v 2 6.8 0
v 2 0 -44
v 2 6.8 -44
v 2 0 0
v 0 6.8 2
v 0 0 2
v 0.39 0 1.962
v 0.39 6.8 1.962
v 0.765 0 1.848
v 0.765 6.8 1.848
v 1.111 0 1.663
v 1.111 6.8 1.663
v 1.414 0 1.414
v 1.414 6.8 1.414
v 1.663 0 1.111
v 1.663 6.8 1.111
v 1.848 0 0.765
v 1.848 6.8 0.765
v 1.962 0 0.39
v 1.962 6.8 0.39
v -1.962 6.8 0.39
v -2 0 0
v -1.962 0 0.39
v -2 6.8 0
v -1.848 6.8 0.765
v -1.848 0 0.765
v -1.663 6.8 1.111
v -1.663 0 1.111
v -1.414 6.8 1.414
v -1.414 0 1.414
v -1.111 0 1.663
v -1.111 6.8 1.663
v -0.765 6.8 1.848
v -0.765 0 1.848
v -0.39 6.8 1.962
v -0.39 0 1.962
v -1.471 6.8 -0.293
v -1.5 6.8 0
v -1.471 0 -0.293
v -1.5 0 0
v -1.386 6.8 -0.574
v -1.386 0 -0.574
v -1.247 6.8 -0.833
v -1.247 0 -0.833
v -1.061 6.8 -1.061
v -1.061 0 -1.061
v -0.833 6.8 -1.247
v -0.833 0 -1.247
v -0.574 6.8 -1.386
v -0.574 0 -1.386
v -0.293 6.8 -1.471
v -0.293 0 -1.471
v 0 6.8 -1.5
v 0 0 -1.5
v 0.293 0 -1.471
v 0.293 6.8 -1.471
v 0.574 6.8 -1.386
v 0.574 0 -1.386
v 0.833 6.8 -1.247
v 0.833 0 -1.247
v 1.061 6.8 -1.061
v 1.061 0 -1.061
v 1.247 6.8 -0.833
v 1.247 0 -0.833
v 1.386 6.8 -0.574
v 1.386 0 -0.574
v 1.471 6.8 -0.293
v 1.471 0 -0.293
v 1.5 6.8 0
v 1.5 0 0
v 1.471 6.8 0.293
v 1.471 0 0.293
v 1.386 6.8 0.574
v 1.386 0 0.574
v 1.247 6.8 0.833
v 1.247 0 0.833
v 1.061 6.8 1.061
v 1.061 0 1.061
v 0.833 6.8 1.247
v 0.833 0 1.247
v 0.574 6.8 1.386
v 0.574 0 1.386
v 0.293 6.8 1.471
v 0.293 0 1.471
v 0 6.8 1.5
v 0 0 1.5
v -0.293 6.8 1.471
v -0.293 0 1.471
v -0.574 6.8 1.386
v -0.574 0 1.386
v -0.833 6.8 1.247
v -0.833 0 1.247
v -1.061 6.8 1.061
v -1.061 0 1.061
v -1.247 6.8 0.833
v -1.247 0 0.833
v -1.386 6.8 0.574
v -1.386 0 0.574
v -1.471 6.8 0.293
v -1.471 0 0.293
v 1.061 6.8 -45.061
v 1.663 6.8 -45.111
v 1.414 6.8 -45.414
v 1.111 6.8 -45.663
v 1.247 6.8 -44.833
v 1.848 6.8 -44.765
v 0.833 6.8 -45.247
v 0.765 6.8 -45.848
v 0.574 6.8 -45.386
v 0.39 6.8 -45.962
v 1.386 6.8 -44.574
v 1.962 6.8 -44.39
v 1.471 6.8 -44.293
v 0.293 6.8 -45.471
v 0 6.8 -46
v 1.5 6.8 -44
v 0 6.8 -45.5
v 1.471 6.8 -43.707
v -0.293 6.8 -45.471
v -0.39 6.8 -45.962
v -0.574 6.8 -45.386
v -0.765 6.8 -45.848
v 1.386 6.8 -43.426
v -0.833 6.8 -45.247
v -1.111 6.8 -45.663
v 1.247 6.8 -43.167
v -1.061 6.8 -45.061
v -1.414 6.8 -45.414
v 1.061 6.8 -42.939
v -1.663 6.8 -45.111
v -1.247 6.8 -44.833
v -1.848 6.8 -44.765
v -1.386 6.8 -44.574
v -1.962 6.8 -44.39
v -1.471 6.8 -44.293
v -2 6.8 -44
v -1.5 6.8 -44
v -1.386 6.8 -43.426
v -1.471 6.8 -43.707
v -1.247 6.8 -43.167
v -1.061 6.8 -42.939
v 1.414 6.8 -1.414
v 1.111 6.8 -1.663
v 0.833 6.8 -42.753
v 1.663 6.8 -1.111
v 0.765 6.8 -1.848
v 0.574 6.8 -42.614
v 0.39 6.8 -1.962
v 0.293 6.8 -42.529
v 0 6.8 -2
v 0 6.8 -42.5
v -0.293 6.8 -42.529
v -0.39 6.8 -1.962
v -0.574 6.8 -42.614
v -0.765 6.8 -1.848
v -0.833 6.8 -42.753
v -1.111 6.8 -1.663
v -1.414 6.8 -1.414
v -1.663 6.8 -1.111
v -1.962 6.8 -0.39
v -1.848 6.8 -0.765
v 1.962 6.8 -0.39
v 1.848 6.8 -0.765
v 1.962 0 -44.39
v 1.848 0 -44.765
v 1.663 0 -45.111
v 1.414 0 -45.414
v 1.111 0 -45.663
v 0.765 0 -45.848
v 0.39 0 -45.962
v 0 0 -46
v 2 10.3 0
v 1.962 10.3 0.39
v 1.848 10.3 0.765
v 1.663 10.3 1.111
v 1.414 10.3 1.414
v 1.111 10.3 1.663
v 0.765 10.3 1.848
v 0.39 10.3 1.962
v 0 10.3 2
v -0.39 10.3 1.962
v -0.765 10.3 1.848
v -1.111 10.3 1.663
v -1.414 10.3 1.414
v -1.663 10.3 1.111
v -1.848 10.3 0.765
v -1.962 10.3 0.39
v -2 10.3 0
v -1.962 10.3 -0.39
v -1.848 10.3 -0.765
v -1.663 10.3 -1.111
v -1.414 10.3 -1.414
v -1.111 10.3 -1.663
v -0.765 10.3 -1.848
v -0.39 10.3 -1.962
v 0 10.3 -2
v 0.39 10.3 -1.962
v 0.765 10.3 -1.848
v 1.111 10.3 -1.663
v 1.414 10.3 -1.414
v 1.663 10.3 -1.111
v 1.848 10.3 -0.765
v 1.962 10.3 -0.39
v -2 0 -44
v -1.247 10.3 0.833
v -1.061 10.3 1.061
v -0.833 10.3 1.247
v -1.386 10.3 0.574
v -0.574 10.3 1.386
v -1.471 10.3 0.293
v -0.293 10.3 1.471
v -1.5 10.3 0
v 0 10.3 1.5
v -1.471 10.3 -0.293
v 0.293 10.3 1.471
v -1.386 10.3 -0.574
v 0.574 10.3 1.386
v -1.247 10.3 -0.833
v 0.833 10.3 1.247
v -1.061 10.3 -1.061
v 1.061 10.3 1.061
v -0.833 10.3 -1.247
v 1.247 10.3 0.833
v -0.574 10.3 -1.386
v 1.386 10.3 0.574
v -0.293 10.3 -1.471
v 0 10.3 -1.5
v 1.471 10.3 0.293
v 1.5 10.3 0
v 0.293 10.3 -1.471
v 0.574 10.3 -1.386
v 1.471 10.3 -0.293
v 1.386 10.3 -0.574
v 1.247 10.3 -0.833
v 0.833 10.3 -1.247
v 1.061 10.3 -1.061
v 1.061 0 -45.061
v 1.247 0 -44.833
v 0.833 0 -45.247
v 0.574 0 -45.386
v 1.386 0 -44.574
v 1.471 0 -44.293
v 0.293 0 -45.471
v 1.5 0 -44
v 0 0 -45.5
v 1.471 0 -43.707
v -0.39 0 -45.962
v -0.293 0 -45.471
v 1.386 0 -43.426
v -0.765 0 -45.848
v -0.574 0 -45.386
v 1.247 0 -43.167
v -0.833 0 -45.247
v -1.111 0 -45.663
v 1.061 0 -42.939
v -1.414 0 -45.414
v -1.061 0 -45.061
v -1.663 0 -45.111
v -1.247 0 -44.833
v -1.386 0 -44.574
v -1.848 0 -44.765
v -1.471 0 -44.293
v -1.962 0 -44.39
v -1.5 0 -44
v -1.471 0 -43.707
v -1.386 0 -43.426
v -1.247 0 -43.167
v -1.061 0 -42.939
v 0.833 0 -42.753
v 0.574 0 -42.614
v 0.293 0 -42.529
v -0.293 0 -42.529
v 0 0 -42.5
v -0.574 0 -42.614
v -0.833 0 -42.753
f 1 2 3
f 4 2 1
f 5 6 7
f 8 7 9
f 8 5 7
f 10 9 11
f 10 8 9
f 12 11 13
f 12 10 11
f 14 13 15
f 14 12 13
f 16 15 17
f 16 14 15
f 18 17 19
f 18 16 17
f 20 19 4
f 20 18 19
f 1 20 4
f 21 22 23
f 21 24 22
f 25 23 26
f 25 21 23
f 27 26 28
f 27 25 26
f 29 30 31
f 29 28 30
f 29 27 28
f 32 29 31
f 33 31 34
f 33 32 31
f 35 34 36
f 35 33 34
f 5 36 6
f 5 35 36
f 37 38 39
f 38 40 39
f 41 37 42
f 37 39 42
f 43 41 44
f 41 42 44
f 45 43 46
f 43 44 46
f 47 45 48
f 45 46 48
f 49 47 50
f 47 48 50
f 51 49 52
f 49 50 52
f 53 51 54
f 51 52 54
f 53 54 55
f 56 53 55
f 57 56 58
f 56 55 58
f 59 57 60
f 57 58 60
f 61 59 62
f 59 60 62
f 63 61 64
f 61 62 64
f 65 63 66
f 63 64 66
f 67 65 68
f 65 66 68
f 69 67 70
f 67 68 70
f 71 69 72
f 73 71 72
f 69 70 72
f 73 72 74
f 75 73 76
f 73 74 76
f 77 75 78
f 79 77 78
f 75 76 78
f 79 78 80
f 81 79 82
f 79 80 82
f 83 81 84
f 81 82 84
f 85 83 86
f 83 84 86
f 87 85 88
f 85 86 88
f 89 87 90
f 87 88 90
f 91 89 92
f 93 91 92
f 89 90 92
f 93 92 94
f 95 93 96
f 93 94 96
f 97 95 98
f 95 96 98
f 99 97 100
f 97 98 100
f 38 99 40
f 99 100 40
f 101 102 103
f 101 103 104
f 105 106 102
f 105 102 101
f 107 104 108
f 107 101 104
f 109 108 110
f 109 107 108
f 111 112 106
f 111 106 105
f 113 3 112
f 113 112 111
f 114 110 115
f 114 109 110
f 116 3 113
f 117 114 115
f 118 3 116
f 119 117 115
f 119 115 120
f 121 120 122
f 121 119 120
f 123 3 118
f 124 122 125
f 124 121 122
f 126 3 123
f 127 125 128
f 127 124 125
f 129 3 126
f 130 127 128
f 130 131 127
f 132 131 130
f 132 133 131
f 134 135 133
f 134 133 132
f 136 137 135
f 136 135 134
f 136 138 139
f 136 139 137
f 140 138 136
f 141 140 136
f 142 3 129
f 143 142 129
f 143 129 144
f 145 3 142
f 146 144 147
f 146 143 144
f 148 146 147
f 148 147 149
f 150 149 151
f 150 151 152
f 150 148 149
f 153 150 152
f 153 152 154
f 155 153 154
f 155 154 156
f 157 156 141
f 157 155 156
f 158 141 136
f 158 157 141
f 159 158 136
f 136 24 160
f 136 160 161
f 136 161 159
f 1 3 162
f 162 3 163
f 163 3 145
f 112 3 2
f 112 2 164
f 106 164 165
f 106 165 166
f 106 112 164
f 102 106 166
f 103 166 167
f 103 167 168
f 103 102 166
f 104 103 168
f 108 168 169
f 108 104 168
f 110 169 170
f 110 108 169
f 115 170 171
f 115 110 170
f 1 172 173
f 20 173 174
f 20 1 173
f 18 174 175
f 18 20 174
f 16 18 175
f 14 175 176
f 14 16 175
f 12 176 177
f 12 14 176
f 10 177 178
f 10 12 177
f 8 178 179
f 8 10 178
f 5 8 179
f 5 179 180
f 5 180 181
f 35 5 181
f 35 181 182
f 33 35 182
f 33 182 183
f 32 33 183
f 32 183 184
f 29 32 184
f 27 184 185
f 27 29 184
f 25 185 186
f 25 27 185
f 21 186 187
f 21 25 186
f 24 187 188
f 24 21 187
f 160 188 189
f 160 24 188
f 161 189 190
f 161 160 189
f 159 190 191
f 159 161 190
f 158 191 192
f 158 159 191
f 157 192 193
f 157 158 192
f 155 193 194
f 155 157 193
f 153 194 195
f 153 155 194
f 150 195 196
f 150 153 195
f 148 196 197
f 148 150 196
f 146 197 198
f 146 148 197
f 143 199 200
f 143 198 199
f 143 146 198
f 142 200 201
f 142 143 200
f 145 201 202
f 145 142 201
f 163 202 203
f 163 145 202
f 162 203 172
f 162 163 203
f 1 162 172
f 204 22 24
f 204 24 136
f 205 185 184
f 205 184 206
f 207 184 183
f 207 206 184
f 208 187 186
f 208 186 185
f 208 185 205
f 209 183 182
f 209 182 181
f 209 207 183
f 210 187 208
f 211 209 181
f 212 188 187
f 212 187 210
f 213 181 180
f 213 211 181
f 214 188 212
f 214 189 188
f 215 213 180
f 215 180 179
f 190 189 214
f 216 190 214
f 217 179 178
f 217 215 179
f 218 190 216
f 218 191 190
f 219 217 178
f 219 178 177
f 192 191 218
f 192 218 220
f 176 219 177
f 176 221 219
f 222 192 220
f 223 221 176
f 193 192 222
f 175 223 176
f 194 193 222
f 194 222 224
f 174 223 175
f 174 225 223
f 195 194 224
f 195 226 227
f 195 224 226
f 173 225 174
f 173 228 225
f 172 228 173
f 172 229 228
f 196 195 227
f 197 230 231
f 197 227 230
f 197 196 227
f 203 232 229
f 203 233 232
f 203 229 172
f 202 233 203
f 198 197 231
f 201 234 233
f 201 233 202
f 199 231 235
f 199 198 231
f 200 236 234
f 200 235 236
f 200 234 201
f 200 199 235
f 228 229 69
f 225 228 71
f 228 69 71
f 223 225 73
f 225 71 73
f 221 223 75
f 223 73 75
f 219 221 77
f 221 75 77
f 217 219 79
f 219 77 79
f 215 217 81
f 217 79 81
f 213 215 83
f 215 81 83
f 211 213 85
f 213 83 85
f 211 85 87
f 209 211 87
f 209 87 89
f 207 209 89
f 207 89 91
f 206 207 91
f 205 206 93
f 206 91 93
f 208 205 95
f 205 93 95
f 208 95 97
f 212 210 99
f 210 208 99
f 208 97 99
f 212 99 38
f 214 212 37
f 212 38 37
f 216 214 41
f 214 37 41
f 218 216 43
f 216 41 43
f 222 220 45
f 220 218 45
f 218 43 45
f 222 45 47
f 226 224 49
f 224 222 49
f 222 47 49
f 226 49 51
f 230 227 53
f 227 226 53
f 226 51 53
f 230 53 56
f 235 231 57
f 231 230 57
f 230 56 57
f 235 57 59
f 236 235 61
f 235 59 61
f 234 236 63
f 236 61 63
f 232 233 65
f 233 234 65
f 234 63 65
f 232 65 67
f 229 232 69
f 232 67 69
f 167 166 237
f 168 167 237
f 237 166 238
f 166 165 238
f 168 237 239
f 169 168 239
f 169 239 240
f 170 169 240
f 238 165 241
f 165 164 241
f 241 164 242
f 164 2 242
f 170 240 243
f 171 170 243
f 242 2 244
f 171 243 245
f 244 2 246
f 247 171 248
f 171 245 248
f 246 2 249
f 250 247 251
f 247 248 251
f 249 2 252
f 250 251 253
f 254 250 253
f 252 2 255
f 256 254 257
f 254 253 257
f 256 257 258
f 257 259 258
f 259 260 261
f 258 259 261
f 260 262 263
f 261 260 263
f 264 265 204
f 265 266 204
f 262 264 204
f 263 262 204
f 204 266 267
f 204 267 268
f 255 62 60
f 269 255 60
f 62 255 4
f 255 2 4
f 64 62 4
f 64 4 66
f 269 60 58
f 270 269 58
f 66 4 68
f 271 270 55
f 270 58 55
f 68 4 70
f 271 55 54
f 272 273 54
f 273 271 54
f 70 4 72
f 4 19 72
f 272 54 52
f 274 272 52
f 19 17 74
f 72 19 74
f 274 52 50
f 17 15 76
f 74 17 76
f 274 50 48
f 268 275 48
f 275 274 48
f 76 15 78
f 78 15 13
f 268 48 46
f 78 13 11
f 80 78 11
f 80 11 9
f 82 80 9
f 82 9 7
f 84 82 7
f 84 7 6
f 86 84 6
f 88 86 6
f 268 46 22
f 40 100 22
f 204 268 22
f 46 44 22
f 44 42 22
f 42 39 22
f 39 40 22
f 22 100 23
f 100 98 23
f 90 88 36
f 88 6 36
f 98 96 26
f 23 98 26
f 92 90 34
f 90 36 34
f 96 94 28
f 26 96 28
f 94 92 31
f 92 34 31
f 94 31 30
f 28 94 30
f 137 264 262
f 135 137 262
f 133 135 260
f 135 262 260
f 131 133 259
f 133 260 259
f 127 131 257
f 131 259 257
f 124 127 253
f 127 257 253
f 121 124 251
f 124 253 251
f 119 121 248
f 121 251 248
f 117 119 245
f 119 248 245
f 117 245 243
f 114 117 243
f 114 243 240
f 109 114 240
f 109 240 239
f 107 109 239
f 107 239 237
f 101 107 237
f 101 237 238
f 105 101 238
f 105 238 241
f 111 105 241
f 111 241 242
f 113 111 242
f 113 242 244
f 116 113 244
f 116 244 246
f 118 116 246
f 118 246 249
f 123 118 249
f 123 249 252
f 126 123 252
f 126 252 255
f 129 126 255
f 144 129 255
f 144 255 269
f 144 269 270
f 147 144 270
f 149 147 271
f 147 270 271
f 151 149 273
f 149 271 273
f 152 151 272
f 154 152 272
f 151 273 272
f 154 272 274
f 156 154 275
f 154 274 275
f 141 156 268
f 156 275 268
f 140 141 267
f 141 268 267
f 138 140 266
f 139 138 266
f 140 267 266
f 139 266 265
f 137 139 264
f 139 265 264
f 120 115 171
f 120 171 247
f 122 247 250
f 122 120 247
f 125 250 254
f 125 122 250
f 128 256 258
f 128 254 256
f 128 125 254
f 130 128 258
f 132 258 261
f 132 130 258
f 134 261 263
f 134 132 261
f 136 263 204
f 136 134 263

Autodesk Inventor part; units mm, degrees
ref_plane "YZ Plane" through (0, 0, 0) normal (1, 0, 0) x (0, 1, 0)
ref_plane "XZ Plane" through (0, 0, 0) normal (0, 1, 0) x (-1, 0, 0)
ref_plane "XY Plane" through (0, 0, 0) normal (0, 0, 1) x (1, 0, 0)
sketch "Szkic1" plane through (0, 0, 0) normal (0, 1, 0) x (-1, 0, 0)
  circle A0 centre (0, 0) radius 1.5
  line L0 (-2, 2) -> (2, 2)
  line L1 (2, 2) -> (2, -2)
  line L2 (2, -2) -> (-2, -2)
  line L3 (-2, -2) -> (-2, 2)
  line L4 (-2, 2) -> (2, -2) construction
  line L5 (2, 2) -> (-2, -2) construction
  line L6 (0, 0) -> (0, -23)
  line L7 (0, 0) -> (23, 0) construction
  line L8 (2, 2) -> (-2, 2)
  line L9 (-2, 2) -> (-2, -22)
  line L10 (-2, -22) -> (2, -22)
  line L11 (2, -22) -> (2, 2)
  circle A1 centre (0, -44) radius 1.5
  line L12 (-2, -46) -> (2, -46)
  line L13 (2, -46) -> (2, -42)
  line L14 (2, -42) -> (-2, -42)
  line L15 (-2, -42) -> (-2, -46)
  line L16 (-2, -46) -> (2, -42) construction
  line L17 (2, -46) -> (-2, -42) construction
  line L18 (0, -44) -> (0, -23)
  line L19 (0, -44) -> (23, -44) construction
  line L20 (2, -46) -> (-2, -46)
  line L21 (-2, -46) -> (-2, -22)
  line L22 (2, -22) -> (2, -46)
  dimension "d0" = 3
  dimension "d1" = 4
  dimension "d2" = 4
  dimension "d3" = 23
  dimension "d4" = 90
  dimension "d5" = 4
  dimension "d6" = 24
extrude "Wyciągnięcie proste1" add sketch "Szkic1" along normal blind 6.8
fillet "Zaokrąglenie1" radius 2 4 edges at (-2, 3.4, 2) (2, 3.4, 2) (-2, 3.4, -46) (2, 3.4, -46)
sketch "Szkic2" plane through (0, 6.8, 0) normal (0, 1, 0) x (1, 0, 0)
  circle A0 centre (0, 0) radius 1.5 projected
  circle A1 centre (0, 0) radius 1.5
  circle A2 centre (0, 0) radius 2
extrude "Wyciągnięcie proste2" add sketch "Szkic2" along normal blind 3.5
properties part number "link_sub"
